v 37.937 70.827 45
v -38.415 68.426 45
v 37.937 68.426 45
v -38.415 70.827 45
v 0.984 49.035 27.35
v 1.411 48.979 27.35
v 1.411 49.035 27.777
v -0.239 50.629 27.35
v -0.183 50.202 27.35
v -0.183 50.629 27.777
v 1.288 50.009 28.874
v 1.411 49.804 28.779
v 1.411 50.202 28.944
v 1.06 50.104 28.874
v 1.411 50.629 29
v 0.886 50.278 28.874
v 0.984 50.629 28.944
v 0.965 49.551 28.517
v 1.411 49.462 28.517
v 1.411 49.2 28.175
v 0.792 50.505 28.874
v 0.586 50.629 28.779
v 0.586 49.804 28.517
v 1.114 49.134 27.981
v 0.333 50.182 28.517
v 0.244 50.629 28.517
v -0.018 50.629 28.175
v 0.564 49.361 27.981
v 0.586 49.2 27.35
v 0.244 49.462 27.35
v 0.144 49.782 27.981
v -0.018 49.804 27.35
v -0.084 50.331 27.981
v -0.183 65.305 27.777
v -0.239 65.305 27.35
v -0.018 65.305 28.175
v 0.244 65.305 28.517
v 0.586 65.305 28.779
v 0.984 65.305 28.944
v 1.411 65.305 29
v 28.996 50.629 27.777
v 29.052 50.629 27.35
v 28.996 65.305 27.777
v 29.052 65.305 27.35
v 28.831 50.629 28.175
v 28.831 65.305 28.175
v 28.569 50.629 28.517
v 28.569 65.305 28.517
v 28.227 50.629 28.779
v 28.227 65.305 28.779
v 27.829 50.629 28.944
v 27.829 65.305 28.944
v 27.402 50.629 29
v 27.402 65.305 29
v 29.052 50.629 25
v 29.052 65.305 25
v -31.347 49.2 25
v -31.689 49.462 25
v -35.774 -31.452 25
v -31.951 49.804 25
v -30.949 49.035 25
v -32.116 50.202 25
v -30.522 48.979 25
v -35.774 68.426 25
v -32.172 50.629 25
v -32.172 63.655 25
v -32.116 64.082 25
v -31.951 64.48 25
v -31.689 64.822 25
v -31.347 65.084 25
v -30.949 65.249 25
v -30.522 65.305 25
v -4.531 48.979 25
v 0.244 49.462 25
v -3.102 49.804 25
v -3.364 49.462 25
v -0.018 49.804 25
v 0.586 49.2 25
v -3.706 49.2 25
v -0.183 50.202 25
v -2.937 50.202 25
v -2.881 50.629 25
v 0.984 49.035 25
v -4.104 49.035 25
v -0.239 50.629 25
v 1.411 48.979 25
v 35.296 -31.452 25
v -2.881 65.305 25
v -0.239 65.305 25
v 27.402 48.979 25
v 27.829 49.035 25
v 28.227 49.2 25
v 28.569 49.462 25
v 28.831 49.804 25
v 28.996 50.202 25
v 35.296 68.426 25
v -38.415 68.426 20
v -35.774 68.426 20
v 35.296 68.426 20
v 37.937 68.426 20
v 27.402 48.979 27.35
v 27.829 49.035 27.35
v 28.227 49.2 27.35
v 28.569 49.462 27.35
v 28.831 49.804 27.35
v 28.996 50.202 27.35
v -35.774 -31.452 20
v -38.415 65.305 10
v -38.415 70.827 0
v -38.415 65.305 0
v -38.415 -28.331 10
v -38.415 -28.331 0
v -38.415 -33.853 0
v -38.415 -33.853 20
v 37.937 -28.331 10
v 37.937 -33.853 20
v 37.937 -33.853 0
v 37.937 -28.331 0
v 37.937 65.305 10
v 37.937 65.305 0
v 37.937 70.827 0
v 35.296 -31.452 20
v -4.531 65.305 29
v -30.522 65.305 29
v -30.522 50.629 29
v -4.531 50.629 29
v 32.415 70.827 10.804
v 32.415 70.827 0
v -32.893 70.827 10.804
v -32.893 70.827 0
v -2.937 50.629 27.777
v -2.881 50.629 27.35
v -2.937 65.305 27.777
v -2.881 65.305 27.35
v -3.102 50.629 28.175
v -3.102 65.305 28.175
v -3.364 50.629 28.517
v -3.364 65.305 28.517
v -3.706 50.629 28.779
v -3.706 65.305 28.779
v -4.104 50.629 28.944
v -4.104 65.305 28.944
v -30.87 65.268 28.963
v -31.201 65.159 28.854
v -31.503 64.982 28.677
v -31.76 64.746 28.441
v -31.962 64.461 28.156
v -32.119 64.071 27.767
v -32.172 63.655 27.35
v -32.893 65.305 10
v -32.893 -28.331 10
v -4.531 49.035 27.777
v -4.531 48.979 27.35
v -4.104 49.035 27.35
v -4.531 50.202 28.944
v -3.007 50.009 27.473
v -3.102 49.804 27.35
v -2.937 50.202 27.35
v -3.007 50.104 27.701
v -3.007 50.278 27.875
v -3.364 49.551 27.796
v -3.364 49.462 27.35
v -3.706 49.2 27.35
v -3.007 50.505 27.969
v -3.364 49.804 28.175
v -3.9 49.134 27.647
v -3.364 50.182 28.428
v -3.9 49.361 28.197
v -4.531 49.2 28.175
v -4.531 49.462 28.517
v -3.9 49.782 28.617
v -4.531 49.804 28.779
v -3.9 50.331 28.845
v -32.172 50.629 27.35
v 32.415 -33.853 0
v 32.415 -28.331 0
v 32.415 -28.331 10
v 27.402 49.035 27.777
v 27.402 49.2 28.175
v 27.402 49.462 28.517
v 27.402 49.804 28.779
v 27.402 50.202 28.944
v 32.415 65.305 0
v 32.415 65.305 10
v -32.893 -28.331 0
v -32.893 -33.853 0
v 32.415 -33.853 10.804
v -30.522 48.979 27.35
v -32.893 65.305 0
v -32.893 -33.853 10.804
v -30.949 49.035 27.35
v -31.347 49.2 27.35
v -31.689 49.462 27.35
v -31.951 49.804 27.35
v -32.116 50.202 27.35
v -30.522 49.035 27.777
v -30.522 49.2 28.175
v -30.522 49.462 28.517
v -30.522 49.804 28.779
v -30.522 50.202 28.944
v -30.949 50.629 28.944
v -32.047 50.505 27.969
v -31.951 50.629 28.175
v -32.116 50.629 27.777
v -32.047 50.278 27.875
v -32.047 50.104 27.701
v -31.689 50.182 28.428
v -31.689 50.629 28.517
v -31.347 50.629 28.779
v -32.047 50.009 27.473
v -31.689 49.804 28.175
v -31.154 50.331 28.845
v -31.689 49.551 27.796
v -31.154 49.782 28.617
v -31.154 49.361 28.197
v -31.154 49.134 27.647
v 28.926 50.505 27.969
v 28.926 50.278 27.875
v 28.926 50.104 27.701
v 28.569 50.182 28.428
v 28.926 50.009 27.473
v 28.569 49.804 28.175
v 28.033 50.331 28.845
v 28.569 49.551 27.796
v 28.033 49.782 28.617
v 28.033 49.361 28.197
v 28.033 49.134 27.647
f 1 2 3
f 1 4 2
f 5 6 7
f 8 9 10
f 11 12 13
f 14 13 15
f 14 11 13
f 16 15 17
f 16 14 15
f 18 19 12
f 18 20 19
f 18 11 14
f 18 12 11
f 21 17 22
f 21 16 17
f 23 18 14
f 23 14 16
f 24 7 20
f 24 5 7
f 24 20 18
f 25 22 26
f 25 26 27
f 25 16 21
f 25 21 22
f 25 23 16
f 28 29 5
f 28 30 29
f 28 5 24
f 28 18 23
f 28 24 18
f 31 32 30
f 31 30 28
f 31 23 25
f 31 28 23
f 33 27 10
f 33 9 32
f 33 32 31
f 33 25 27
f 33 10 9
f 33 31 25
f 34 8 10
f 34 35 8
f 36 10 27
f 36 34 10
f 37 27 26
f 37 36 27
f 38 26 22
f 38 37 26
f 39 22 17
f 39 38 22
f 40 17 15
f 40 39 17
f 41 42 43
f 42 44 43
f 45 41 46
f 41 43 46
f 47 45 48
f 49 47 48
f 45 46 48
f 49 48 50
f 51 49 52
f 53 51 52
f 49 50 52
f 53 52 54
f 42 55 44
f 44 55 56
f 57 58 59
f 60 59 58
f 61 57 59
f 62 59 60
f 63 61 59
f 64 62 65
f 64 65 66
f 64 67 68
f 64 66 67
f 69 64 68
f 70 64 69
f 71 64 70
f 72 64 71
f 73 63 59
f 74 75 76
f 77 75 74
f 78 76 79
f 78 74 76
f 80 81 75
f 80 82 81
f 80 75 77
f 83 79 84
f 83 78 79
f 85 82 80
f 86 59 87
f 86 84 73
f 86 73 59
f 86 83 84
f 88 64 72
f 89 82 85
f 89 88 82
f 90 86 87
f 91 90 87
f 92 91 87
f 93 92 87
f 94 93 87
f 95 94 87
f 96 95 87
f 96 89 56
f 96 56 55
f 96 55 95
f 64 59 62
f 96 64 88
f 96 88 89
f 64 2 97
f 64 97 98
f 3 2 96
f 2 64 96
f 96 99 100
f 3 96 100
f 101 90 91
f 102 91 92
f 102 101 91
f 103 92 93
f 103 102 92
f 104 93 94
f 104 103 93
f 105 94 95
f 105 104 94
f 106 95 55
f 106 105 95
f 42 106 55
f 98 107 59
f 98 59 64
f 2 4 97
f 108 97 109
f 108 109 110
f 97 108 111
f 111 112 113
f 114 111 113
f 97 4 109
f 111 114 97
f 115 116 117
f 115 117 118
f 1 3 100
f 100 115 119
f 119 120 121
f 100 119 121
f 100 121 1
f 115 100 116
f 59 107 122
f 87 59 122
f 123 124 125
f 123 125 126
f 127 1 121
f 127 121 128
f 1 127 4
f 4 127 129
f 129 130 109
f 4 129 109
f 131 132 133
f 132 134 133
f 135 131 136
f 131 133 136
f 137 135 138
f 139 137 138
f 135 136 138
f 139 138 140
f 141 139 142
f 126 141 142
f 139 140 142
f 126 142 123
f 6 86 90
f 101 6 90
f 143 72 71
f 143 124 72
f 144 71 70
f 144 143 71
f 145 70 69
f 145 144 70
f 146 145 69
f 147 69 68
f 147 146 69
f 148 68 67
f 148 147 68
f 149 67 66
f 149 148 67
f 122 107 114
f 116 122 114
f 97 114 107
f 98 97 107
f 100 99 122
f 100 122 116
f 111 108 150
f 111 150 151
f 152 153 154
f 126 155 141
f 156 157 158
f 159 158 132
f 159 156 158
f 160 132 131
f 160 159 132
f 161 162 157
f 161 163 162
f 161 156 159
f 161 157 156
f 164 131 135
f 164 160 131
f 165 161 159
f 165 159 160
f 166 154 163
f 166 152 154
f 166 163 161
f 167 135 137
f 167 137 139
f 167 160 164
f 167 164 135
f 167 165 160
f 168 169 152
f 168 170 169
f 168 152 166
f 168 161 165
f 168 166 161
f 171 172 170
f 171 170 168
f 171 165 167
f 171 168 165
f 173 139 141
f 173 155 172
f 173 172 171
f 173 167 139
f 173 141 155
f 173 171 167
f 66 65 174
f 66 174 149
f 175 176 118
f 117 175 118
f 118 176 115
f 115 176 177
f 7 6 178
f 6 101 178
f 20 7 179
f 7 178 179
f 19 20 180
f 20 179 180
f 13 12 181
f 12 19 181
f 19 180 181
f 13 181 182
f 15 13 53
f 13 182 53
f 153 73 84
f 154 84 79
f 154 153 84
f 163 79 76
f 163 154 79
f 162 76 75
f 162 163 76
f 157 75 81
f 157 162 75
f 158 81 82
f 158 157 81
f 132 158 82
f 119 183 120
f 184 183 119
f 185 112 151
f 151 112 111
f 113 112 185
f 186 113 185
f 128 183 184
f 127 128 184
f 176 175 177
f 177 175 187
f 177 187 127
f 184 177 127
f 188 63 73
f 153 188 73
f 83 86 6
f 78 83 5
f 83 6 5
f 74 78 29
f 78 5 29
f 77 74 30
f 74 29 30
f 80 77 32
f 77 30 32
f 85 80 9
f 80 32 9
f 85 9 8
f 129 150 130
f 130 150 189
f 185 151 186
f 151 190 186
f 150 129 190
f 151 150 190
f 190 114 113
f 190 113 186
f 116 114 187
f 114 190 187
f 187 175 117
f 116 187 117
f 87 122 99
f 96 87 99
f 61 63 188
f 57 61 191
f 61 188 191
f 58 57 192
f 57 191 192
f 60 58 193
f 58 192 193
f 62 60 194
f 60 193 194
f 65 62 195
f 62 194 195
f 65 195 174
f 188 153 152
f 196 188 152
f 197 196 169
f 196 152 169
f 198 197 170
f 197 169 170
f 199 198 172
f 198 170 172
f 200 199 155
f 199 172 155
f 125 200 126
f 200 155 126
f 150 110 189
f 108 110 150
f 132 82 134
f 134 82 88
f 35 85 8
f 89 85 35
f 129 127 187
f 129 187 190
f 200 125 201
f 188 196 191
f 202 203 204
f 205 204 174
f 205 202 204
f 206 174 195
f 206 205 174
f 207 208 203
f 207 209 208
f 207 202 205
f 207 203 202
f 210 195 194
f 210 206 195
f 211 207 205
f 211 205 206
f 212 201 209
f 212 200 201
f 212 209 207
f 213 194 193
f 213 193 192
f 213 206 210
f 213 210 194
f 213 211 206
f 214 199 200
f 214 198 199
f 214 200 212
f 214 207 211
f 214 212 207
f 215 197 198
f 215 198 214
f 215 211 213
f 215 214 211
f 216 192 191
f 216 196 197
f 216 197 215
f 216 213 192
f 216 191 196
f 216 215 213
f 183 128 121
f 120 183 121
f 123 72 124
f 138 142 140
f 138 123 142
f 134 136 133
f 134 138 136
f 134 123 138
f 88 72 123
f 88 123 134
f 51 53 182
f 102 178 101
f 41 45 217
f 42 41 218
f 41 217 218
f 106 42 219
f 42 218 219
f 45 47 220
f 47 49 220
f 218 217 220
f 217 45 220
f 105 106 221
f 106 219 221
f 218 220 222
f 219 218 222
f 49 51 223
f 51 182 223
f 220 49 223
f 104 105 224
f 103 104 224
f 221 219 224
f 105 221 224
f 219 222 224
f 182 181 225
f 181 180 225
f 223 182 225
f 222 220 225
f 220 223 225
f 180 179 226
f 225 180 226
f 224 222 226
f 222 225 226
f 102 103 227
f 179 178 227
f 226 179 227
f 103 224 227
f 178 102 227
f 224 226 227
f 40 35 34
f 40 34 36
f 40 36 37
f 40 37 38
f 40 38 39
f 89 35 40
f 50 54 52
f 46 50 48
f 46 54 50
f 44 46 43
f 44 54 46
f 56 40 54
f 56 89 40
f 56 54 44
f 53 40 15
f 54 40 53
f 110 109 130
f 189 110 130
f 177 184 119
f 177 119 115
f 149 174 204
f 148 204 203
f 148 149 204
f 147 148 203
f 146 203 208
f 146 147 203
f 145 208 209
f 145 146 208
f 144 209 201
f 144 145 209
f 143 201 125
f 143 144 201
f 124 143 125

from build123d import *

# Parameters (mm, degrees)
F0_W      = 76.35137
F0_H      = 104.6798825264
F1_DEPTH  = 20
F3_DEPTH  = 105
F4_W      = 93.6356825264
F4_H      = 10
F5_DEPTH  = 100
F7_DEPTH  = 25
F6_W      = 71.0693526958
F6_H      = 99.8780601819
F8_DEPTH  = 5
F9_W      = 29.2911557481
F9_H      = 16.3262225688
F9_W_2    = 29.291
F10_DEPTH = 4
F11_R     = 1.65


with BuildPart() as f1:
    # F0 (on Top) → F1 (new body)
    with BuildSketch(Plane.XY):
        with Locations((-0.238945, 18.4870436788)):
            Rectangle(F0_W, F0_H)
    extrude(amount=F1_DEPTH)

    # F2 (on face) → F3 (cut)
    with BuildSketch(Plane.XZ.offset(33.8528975844)):
        Polygon((32.4146378825, 10.8041167259), (-32.89253, 10.8041167259), (-32.89253, 9.3744061509), (-32.89253, 0), (32.4146378825, 0), (32.4146378825, 9.3744061509), align=None)
    extrude(amount=-F3_DEPTH, mode=Mode.SUBTRACT)

    # F4 (on face) → F5 (cut)
    with BuildSketch(Plane(origin=(-38.41463, 0, 0), x_dir=(0, -1, 0), z_dir=(-1, 0, 0))):
        with Locations((-18.4870436788, 5)):
            Rectangle(F4_W, F4_H)
    extrude(amount=-F5_DEPTH, mode=Mode.SUBTRACT)

    # F6 (on face) → F7 (join)
    with BuildSketch(Plane.XY.offset(20)):
        Polygon((-38.41463, 68.4260725975), (-35.7736226958, 68.4260725975), (35.29573, 68.4260725975), (37.93674, 68.4260725975), (37.93674, 70.826984942), (-38.41463, 70.826984942), align=None)
    extrude(amount=F7_DEPTH)

    # F6 (on face) → F8 (join)
    with BuildSketch(Plane.XY.offset(20)):
        with Locations((-0.2389463479, 18.4870425065)):
            Rectangle(F6_W, F6_H)
    extrude(amount=F8_DEPTH)

    # F9 (on face) → F10 (join)
    with BuildSketch(Plane.XY.offset(25)):
        with Locations((-17.5266725798, 57.14177154)):
            Rectangle(F9_W, F9_H)
        with Locations((14.4065536521, 57.14177154)):
            Rectangle(F9_W_2, F9_H)
    extrude(amount=F10_DEPTH)

    # F11
    f11_edges = [f1.edges().sort_by_distance(p)[0] for p in [
        (-17.526673, 48.97866, 29),
        (-32.17225, 65.304883, 27),
        (-0.238946, 48.97866, 27),
        (14.406554, 48.97866, 29),
        (-0.238946, 57.141772, 29),
        (-32.17225, 57.141772, 29),
        (-32.17225, 48.97866, 27),
        (-2.881095, 48.97866, 27),
        (-2.881095, 57.141772, 29),
        (29.052054, 57.141772, 29),
        (29.052054, 48.97866, 27),
    ]]
    fillet(f11_edges, radius=F11_R)


solid = f1.part
